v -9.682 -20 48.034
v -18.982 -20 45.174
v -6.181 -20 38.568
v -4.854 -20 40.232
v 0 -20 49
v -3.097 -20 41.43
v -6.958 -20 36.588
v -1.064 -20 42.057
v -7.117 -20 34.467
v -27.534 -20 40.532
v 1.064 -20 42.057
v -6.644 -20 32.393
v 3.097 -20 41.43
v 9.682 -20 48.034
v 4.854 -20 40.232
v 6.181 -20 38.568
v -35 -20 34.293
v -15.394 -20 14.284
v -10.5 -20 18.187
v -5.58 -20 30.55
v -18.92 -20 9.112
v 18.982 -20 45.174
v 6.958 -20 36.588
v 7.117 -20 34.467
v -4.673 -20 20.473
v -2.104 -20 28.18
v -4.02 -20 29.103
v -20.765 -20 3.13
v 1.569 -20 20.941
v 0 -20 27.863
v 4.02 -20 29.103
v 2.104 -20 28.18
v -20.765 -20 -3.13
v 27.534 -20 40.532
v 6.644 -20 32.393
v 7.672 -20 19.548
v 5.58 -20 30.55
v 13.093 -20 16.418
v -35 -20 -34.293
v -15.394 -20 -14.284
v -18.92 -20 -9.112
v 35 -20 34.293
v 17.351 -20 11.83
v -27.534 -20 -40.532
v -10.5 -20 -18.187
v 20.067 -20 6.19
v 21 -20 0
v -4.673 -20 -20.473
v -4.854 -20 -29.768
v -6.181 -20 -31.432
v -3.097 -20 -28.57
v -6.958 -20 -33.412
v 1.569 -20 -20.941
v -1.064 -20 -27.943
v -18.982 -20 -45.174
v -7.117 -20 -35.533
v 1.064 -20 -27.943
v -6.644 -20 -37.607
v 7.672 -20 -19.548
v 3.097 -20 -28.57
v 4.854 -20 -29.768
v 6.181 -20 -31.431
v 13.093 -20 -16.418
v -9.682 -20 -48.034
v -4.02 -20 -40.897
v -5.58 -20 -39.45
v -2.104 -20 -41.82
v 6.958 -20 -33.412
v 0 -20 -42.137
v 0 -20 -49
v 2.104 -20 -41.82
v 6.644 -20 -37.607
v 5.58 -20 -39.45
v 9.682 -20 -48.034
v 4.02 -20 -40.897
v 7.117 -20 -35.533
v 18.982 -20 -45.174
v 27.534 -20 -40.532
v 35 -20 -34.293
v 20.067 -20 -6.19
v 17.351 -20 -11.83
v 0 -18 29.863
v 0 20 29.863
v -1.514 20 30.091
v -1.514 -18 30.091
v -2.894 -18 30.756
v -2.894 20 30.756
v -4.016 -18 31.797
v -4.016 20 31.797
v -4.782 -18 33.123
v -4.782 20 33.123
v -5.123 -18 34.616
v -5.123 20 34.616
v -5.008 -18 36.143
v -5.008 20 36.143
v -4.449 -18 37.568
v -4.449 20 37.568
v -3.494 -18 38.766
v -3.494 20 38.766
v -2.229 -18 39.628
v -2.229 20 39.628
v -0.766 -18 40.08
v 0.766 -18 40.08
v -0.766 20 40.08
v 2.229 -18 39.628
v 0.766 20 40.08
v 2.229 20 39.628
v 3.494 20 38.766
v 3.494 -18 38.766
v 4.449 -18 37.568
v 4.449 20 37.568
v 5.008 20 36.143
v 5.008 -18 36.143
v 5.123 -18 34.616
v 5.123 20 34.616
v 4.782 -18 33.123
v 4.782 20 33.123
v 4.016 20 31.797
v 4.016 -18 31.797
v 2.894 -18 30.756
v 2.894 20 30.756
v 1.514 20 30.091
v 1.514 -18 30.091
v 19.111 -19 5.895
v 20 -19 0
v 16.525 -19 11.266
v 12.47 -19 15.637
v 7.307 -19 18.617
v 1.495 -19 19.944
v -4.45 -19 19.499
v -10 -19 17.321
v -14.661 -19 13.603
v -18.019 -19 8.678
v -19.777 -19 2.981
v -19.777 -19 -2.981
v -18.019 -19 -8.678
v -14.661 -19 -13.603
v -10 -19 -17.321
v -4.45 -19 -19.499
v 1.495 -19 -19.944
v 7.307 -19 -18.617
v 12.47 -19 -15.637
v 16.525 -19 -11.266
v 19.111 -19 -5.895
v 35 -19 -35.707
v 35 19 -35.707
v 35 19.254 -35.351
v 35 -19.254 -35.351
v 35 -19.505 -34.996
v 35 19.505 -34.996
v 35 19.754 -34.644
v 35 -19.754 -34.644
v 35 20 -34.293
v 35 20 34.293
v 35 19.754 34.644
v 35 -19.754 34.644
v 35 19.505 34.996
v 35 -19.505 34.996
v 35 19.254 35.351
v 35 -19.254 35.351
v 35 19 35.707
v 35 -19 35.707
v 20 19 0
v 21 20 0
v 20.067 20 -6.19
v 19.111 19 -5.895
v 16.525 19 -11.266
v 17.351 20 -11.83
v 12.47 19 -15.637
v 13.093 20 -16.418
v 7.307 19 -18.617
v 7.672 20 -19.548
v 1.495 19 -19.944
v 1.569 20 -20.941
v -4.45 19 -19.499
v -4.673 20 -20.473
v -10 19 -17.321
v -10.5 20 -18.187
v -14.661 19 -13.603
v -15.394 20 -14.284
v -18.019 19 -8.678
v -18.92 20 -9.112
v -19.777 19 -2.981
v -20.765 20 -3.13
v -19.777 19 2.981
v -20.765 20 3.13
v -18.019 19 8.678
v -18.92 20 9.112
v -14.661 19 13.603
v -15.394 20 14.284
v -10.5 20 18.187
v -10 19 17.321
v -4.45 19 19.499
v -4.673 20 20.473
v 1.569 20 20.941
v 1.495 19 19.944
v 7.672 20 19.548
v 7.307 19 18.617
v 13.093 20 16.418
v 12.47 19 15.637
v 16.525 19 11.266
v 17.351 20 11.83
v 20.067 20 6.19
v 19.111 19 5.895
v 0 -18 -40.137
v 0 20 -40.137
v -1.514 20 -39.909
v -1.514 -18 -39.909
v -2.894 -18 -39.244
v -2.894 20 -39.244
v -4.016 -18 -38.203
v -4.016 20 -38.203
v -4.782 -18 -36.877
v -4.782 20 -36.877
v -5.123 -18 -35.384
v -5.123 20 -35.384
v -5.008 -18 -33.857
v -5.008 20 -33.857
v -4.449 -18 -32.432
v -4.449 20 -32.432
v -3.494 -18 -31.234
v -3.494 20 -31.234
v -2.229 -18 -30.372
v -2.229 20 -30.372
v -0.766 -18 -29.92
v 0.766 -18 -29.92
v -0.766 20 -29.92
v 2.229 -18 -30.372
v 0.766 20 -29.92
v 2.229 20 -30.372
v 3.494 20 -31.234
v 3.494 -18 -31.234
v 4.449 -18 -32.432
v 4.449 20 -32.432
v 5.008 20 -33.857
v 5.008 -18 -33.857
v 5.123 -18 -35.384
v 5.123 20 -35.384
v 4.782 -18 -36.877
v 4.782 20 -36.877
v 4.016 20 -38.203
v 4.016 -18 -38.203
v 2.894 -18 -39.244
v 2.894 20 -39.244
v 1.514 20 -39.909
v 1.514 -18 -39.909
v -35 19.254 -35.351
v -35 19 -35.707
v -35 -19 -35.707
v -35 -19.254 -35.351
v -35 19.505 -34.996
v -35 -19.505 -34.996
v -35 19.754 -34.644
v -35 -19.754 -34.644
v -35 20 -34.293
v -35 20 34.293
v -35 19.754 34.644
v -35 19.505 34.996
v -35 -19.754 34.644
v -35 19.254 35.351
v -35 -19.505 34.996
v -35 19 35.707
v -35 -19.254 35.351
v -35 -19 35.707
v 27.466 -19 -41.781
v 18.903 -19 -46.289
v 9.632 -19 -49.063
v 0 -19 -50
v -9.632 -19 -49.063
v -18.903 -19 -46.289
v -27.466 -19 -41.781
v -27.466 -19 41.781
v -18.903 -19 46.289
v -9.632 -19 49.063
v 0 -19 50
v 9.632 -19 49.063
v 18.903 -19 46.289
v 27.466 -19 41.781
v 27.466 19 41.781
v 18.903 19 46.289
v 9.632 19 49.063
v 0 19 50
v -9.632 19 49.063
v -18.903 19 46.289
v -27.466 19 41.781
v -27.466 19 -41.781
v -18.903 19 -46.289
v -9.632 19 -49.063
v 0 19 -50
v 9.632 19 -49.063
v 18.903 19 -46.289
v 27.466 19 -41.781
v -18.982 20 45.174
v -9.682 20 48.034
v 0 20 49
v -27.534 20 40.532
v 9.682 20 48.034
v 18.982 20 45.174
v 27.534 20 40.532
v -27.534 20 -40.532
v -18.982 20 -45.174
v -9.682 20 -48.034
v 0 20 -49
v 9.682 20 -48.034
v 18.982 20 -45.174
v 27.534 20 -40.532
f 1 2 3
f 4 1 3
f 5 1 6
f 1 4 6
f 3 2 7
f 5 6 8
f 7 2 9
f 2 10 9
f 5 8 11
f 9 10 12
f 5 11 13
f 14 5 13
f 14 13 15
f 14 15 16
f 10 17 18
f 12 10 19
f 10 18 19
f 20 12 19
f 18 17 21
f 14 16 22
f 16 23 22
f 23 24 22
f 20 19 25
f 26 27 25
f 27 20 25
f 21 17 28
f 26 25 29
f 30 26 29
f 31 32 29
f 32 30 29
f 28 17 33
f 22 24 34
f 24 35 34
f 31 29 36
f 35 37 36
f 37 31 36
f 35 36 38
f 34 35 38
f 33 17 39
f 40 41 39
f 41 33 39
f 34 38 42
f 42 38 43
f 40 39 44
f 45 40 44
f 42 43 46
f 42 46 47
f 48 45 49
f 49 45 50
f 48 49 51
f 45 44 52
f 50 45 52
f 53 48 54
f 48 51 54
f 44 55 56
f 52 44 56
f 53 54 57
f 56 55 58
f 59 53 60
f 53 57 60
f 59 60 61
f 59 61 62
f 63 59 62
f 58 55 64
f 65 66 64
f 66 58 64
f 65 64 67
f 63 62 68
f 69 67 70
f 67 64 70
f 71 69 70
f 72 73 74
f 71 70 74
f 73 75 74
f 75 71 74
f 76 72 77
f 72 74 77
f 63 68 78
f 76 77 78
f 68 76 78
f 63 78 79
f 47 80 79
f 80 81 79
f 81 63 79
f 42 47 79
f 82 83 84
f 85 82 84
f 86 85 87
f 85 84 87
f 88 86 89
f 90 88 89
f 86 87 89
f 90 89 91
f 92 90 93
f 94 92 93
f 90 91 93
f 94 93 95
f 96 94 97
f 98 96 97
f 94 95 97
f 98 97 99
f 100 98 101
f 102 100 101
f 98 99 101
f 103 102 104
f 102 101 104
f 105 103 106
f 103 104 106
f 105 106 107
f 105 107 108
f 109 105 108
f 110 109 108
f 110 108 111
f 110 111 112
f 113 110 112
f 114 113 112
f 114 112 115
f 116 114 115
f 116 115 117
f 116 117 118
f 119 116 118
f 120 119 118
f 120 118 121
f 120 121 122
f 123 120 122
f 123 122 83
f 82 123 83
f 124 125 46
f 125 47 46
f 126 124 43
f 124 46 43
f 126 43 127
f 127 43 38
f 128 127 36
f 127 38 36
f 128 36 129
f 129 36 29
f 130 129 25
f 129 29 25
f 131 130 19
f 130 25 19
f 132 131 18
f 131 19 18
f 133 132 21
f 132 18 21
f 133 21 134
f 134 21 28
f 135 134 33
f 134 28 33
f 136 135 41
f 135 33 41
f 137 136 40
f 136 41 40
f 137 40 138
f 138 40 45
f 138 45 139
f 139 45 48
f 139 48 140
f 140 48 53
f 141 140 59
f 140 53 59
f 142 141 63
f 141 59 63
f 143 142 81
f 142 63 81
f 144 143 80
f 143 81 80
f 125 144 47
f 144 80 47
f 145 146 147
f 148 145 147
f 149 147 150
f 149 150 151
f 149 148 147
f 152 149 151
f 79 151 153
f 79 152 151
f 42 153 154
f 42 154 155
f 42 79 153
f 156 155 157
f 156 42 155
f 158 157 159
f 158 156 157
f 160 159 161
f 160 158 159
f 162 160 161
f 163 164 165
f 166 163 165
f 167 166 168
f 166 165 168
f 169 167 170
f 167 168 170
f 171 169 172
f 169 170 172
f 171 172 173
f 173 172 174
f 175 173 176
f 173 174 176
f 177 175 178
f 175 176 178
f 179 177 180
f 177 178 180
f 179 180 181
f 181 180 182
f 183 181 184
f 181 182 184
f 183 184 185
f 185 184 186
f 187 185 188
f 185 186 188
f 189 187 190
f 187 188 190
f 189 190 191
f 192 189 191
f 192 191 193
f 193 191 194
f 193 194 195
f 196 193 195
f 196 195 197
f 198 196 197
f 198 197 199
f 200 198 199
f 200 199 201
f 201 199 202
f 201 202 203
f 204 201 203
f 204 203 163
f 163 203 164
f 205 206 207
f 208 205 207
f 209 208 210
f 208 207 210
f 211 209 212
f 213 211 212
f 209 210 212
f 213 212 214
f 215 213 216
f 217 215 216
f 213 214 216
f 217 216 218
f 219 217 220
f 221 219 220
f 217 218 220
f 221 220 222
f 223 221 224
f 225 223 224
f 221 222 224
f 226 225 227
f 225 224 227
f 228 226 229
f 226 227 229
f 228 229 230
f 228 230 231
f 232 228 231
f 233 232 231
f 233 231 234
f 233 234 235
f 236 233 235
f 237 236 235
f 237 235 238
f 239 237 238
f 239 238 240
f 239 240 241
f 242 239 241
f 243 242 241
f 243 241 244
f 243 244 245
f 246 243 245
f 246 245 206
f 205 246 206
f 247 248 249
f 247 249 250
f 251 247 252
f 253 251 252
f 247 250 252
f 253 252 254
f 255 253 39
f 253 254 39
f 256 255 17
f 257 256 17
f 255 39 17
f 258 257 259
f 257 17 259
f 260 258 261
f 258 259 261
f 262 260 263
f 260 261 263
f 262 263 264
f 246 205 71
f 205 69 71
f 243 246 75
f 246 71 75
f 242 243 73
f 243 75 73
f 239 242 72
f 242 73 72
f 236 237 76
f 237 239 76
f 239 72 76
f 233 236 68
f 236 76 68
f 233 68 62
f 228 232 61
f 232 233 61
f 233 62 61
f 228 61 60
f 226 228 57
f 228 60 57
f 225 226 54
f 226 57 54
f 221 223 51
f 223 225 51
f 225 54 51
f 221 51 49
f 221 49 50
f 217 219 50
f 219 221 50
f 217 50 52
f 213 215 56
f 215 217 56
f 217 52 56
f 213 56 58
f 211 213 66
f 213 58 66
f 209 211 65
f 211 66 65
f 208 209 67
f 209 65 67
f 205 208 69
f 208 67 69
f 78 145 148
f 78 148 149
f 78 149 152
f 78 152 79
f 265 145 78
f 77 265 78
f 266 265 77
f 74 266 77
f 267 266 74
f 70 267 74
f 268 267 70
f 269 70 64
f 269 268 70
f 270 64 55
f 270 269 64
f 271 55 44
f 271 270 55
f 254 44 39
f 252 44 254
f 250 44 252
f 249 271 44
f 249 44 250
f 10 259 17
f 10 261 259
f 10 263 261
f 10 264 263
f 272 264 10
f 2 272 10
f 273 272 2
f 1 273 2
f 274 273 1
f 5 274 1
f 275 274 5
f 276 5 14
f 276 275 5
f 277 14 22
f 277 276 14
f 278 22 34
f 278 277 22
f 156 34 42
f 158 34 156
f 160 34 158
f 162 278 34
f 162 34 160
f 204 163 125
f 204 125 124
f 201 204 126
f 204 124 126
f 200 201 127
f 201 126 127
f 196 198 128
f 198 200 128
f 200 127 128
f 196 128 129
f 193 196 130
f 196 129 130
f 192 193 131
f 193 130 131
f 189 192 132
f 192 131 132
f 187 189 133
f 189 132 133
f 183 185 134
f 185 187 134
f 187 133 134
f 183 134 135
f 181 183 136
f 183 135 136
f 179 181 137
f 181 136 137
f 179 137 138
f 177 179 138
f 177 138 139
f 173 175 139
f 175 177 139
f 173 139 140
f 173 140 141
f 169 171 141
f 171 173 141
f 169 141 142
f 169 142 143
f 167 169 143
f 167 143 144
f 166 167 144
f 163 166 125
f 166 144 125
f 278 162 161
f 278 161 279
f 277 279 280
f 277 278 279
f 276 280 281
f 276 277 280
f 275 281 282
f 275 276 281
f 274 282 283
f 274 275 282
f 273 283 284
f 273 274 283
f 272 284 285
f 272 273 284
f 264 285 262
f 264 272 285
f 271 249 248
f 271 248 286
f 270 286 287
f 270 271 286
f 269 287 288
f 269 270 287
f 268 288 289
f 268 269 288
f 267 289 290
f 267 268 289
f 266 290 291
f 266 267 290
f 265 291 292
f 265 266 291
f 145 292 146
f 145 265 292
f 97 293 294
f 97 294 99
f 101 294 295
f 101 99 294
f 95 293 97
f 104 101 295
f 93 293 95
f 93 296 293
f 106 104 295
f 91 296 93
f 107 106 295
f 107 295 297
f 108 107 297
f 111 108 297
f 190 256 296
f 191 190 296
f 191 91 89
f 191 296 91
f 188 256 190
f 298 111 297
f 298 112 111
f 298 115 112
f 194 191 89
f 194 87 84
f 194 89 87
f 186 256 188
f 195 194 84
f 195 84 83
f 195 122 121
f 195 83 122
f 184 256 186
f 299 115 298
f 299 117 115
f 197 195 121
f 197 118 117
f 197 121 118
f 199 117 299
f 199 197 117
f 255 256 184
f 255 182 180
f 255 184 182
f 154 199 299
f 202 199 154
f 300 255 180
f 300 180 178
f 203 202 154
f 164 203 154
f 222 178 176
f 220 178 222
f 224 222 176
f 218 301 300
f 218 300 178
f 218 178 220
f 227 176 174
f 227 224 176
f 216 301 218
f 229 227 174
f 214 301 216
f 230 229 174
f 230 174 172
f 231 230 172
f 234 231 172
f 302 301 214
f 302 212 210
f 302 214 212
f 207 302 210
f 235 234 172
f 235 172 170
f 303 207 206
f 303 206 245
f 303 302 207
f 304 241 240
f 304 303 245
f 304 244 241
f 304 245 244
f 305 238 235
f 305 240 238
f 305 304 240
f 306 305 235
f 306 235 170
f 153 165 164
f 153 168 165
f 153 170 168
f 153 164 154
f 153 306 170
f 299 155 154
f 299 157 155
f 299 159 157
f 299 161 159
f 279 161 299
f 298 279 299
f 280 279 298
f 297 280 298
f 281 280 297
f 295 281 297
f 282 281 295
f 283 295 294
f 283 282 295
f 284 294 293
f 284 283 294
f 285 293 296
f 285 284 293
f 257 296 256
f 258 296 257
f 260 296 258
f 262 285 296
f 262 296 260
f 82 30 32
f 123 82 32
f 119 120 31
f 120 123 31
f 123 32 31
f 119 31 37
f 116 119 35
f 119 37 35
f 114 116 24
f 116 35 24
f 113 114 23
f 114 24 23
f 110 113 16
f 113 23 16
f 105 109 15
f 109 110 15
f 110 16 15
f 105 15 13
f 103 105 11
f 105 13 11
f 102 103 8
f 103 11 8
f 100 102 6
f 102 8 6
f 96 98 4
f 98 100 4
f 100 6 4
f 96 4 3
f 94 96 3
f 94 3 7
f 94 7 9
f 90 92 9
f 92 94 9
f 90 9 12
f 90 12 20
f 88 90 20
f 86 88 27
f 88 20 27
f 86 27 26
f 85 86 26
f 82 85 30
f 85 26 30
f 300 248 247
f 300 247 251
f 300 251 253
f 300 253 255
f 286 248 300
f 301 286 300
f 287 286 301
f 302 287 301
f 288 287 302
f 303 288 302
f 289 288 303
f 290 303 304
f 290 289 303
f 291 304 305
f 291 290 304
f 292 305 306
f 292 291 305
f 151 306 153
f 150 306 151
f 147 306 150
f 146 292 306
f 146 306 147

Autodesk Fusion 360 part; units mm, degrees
sketch "Sketch1" plane through (0, 0, 0) normal (0, 1, 0) x (1, 0, 0)
  circle A0 centre (0, 0) radius 20
  line L0 (-35, 35.7071) -> (-35, -35.7071)
  line L1 (0, 0) -> (0, 70.7339) construction
  line L2 (35, 35.7071) -> (35, -35.7071)
  arc A1 (-35, -35.7071) -> (35, -35.7071) centre (0, 0) ccw
  arc A2 (35, 35.7071) -> (-35, 35.7071) centre (0, 0) ccw
  dimension "d1" = 40
  dimension "d2" = 100
  dimension "d3" = 70
  dimension "d6" = 35
extrude "Extrude1" add sketch "Sketch1" along normal mid plane 40
sketch "Sketch2" plane through (0, 20, 0) normal (0, 1, 0) x (-1, 0, 0)
  circle A0 centre (0, 0) radius 20
  arc A1 (-35, -35.7071) -> (35, -35.7071) centre (0, 0) ccw
  line L0 (35, -35.7071) -> (35, 35.7071)
  arc A2 (35, 35.7071) -> (-35, 35.7071) centre (0, 0) ccw
  line L1 (-35, 35.7071) -> (-35, -35.7071)
  circle A3 centre (0, -35) radius 5
  line L2 (0, 0) -> (45, 0) construction
  circle A4 centre (0, 35) radius 5
  dimension "d7" = 10
  dimension "d8" = 35
extrude "Extrude2" cut sketch "Sketch2" against normal blind 80 contours A3 | A4
chamfer "Chamfer1" distance 1 angle 45 3 edges at (0, 20, -50) (0, 20, 50) (-18.6465, 20, -7.2323)
chamfer "Chamfer1" distance 1 angle 45 3 edges at (0, -20, -50) (0, -20, 50) (-18.6465, -20, 7.2323)
hole "Hole1" at (0, -20, -35) direction (0, 1, 0) diameter 10.274 end through all
hole "Hole2" at (0, -20, 35) direction (0, 1, 0) diameter 10.274 end through all
chamfer "Chamfer2" distance 2 angle 45 2 edges at (1.8575, -20, -30.2109) (1.8575, -20, 39.7891)
